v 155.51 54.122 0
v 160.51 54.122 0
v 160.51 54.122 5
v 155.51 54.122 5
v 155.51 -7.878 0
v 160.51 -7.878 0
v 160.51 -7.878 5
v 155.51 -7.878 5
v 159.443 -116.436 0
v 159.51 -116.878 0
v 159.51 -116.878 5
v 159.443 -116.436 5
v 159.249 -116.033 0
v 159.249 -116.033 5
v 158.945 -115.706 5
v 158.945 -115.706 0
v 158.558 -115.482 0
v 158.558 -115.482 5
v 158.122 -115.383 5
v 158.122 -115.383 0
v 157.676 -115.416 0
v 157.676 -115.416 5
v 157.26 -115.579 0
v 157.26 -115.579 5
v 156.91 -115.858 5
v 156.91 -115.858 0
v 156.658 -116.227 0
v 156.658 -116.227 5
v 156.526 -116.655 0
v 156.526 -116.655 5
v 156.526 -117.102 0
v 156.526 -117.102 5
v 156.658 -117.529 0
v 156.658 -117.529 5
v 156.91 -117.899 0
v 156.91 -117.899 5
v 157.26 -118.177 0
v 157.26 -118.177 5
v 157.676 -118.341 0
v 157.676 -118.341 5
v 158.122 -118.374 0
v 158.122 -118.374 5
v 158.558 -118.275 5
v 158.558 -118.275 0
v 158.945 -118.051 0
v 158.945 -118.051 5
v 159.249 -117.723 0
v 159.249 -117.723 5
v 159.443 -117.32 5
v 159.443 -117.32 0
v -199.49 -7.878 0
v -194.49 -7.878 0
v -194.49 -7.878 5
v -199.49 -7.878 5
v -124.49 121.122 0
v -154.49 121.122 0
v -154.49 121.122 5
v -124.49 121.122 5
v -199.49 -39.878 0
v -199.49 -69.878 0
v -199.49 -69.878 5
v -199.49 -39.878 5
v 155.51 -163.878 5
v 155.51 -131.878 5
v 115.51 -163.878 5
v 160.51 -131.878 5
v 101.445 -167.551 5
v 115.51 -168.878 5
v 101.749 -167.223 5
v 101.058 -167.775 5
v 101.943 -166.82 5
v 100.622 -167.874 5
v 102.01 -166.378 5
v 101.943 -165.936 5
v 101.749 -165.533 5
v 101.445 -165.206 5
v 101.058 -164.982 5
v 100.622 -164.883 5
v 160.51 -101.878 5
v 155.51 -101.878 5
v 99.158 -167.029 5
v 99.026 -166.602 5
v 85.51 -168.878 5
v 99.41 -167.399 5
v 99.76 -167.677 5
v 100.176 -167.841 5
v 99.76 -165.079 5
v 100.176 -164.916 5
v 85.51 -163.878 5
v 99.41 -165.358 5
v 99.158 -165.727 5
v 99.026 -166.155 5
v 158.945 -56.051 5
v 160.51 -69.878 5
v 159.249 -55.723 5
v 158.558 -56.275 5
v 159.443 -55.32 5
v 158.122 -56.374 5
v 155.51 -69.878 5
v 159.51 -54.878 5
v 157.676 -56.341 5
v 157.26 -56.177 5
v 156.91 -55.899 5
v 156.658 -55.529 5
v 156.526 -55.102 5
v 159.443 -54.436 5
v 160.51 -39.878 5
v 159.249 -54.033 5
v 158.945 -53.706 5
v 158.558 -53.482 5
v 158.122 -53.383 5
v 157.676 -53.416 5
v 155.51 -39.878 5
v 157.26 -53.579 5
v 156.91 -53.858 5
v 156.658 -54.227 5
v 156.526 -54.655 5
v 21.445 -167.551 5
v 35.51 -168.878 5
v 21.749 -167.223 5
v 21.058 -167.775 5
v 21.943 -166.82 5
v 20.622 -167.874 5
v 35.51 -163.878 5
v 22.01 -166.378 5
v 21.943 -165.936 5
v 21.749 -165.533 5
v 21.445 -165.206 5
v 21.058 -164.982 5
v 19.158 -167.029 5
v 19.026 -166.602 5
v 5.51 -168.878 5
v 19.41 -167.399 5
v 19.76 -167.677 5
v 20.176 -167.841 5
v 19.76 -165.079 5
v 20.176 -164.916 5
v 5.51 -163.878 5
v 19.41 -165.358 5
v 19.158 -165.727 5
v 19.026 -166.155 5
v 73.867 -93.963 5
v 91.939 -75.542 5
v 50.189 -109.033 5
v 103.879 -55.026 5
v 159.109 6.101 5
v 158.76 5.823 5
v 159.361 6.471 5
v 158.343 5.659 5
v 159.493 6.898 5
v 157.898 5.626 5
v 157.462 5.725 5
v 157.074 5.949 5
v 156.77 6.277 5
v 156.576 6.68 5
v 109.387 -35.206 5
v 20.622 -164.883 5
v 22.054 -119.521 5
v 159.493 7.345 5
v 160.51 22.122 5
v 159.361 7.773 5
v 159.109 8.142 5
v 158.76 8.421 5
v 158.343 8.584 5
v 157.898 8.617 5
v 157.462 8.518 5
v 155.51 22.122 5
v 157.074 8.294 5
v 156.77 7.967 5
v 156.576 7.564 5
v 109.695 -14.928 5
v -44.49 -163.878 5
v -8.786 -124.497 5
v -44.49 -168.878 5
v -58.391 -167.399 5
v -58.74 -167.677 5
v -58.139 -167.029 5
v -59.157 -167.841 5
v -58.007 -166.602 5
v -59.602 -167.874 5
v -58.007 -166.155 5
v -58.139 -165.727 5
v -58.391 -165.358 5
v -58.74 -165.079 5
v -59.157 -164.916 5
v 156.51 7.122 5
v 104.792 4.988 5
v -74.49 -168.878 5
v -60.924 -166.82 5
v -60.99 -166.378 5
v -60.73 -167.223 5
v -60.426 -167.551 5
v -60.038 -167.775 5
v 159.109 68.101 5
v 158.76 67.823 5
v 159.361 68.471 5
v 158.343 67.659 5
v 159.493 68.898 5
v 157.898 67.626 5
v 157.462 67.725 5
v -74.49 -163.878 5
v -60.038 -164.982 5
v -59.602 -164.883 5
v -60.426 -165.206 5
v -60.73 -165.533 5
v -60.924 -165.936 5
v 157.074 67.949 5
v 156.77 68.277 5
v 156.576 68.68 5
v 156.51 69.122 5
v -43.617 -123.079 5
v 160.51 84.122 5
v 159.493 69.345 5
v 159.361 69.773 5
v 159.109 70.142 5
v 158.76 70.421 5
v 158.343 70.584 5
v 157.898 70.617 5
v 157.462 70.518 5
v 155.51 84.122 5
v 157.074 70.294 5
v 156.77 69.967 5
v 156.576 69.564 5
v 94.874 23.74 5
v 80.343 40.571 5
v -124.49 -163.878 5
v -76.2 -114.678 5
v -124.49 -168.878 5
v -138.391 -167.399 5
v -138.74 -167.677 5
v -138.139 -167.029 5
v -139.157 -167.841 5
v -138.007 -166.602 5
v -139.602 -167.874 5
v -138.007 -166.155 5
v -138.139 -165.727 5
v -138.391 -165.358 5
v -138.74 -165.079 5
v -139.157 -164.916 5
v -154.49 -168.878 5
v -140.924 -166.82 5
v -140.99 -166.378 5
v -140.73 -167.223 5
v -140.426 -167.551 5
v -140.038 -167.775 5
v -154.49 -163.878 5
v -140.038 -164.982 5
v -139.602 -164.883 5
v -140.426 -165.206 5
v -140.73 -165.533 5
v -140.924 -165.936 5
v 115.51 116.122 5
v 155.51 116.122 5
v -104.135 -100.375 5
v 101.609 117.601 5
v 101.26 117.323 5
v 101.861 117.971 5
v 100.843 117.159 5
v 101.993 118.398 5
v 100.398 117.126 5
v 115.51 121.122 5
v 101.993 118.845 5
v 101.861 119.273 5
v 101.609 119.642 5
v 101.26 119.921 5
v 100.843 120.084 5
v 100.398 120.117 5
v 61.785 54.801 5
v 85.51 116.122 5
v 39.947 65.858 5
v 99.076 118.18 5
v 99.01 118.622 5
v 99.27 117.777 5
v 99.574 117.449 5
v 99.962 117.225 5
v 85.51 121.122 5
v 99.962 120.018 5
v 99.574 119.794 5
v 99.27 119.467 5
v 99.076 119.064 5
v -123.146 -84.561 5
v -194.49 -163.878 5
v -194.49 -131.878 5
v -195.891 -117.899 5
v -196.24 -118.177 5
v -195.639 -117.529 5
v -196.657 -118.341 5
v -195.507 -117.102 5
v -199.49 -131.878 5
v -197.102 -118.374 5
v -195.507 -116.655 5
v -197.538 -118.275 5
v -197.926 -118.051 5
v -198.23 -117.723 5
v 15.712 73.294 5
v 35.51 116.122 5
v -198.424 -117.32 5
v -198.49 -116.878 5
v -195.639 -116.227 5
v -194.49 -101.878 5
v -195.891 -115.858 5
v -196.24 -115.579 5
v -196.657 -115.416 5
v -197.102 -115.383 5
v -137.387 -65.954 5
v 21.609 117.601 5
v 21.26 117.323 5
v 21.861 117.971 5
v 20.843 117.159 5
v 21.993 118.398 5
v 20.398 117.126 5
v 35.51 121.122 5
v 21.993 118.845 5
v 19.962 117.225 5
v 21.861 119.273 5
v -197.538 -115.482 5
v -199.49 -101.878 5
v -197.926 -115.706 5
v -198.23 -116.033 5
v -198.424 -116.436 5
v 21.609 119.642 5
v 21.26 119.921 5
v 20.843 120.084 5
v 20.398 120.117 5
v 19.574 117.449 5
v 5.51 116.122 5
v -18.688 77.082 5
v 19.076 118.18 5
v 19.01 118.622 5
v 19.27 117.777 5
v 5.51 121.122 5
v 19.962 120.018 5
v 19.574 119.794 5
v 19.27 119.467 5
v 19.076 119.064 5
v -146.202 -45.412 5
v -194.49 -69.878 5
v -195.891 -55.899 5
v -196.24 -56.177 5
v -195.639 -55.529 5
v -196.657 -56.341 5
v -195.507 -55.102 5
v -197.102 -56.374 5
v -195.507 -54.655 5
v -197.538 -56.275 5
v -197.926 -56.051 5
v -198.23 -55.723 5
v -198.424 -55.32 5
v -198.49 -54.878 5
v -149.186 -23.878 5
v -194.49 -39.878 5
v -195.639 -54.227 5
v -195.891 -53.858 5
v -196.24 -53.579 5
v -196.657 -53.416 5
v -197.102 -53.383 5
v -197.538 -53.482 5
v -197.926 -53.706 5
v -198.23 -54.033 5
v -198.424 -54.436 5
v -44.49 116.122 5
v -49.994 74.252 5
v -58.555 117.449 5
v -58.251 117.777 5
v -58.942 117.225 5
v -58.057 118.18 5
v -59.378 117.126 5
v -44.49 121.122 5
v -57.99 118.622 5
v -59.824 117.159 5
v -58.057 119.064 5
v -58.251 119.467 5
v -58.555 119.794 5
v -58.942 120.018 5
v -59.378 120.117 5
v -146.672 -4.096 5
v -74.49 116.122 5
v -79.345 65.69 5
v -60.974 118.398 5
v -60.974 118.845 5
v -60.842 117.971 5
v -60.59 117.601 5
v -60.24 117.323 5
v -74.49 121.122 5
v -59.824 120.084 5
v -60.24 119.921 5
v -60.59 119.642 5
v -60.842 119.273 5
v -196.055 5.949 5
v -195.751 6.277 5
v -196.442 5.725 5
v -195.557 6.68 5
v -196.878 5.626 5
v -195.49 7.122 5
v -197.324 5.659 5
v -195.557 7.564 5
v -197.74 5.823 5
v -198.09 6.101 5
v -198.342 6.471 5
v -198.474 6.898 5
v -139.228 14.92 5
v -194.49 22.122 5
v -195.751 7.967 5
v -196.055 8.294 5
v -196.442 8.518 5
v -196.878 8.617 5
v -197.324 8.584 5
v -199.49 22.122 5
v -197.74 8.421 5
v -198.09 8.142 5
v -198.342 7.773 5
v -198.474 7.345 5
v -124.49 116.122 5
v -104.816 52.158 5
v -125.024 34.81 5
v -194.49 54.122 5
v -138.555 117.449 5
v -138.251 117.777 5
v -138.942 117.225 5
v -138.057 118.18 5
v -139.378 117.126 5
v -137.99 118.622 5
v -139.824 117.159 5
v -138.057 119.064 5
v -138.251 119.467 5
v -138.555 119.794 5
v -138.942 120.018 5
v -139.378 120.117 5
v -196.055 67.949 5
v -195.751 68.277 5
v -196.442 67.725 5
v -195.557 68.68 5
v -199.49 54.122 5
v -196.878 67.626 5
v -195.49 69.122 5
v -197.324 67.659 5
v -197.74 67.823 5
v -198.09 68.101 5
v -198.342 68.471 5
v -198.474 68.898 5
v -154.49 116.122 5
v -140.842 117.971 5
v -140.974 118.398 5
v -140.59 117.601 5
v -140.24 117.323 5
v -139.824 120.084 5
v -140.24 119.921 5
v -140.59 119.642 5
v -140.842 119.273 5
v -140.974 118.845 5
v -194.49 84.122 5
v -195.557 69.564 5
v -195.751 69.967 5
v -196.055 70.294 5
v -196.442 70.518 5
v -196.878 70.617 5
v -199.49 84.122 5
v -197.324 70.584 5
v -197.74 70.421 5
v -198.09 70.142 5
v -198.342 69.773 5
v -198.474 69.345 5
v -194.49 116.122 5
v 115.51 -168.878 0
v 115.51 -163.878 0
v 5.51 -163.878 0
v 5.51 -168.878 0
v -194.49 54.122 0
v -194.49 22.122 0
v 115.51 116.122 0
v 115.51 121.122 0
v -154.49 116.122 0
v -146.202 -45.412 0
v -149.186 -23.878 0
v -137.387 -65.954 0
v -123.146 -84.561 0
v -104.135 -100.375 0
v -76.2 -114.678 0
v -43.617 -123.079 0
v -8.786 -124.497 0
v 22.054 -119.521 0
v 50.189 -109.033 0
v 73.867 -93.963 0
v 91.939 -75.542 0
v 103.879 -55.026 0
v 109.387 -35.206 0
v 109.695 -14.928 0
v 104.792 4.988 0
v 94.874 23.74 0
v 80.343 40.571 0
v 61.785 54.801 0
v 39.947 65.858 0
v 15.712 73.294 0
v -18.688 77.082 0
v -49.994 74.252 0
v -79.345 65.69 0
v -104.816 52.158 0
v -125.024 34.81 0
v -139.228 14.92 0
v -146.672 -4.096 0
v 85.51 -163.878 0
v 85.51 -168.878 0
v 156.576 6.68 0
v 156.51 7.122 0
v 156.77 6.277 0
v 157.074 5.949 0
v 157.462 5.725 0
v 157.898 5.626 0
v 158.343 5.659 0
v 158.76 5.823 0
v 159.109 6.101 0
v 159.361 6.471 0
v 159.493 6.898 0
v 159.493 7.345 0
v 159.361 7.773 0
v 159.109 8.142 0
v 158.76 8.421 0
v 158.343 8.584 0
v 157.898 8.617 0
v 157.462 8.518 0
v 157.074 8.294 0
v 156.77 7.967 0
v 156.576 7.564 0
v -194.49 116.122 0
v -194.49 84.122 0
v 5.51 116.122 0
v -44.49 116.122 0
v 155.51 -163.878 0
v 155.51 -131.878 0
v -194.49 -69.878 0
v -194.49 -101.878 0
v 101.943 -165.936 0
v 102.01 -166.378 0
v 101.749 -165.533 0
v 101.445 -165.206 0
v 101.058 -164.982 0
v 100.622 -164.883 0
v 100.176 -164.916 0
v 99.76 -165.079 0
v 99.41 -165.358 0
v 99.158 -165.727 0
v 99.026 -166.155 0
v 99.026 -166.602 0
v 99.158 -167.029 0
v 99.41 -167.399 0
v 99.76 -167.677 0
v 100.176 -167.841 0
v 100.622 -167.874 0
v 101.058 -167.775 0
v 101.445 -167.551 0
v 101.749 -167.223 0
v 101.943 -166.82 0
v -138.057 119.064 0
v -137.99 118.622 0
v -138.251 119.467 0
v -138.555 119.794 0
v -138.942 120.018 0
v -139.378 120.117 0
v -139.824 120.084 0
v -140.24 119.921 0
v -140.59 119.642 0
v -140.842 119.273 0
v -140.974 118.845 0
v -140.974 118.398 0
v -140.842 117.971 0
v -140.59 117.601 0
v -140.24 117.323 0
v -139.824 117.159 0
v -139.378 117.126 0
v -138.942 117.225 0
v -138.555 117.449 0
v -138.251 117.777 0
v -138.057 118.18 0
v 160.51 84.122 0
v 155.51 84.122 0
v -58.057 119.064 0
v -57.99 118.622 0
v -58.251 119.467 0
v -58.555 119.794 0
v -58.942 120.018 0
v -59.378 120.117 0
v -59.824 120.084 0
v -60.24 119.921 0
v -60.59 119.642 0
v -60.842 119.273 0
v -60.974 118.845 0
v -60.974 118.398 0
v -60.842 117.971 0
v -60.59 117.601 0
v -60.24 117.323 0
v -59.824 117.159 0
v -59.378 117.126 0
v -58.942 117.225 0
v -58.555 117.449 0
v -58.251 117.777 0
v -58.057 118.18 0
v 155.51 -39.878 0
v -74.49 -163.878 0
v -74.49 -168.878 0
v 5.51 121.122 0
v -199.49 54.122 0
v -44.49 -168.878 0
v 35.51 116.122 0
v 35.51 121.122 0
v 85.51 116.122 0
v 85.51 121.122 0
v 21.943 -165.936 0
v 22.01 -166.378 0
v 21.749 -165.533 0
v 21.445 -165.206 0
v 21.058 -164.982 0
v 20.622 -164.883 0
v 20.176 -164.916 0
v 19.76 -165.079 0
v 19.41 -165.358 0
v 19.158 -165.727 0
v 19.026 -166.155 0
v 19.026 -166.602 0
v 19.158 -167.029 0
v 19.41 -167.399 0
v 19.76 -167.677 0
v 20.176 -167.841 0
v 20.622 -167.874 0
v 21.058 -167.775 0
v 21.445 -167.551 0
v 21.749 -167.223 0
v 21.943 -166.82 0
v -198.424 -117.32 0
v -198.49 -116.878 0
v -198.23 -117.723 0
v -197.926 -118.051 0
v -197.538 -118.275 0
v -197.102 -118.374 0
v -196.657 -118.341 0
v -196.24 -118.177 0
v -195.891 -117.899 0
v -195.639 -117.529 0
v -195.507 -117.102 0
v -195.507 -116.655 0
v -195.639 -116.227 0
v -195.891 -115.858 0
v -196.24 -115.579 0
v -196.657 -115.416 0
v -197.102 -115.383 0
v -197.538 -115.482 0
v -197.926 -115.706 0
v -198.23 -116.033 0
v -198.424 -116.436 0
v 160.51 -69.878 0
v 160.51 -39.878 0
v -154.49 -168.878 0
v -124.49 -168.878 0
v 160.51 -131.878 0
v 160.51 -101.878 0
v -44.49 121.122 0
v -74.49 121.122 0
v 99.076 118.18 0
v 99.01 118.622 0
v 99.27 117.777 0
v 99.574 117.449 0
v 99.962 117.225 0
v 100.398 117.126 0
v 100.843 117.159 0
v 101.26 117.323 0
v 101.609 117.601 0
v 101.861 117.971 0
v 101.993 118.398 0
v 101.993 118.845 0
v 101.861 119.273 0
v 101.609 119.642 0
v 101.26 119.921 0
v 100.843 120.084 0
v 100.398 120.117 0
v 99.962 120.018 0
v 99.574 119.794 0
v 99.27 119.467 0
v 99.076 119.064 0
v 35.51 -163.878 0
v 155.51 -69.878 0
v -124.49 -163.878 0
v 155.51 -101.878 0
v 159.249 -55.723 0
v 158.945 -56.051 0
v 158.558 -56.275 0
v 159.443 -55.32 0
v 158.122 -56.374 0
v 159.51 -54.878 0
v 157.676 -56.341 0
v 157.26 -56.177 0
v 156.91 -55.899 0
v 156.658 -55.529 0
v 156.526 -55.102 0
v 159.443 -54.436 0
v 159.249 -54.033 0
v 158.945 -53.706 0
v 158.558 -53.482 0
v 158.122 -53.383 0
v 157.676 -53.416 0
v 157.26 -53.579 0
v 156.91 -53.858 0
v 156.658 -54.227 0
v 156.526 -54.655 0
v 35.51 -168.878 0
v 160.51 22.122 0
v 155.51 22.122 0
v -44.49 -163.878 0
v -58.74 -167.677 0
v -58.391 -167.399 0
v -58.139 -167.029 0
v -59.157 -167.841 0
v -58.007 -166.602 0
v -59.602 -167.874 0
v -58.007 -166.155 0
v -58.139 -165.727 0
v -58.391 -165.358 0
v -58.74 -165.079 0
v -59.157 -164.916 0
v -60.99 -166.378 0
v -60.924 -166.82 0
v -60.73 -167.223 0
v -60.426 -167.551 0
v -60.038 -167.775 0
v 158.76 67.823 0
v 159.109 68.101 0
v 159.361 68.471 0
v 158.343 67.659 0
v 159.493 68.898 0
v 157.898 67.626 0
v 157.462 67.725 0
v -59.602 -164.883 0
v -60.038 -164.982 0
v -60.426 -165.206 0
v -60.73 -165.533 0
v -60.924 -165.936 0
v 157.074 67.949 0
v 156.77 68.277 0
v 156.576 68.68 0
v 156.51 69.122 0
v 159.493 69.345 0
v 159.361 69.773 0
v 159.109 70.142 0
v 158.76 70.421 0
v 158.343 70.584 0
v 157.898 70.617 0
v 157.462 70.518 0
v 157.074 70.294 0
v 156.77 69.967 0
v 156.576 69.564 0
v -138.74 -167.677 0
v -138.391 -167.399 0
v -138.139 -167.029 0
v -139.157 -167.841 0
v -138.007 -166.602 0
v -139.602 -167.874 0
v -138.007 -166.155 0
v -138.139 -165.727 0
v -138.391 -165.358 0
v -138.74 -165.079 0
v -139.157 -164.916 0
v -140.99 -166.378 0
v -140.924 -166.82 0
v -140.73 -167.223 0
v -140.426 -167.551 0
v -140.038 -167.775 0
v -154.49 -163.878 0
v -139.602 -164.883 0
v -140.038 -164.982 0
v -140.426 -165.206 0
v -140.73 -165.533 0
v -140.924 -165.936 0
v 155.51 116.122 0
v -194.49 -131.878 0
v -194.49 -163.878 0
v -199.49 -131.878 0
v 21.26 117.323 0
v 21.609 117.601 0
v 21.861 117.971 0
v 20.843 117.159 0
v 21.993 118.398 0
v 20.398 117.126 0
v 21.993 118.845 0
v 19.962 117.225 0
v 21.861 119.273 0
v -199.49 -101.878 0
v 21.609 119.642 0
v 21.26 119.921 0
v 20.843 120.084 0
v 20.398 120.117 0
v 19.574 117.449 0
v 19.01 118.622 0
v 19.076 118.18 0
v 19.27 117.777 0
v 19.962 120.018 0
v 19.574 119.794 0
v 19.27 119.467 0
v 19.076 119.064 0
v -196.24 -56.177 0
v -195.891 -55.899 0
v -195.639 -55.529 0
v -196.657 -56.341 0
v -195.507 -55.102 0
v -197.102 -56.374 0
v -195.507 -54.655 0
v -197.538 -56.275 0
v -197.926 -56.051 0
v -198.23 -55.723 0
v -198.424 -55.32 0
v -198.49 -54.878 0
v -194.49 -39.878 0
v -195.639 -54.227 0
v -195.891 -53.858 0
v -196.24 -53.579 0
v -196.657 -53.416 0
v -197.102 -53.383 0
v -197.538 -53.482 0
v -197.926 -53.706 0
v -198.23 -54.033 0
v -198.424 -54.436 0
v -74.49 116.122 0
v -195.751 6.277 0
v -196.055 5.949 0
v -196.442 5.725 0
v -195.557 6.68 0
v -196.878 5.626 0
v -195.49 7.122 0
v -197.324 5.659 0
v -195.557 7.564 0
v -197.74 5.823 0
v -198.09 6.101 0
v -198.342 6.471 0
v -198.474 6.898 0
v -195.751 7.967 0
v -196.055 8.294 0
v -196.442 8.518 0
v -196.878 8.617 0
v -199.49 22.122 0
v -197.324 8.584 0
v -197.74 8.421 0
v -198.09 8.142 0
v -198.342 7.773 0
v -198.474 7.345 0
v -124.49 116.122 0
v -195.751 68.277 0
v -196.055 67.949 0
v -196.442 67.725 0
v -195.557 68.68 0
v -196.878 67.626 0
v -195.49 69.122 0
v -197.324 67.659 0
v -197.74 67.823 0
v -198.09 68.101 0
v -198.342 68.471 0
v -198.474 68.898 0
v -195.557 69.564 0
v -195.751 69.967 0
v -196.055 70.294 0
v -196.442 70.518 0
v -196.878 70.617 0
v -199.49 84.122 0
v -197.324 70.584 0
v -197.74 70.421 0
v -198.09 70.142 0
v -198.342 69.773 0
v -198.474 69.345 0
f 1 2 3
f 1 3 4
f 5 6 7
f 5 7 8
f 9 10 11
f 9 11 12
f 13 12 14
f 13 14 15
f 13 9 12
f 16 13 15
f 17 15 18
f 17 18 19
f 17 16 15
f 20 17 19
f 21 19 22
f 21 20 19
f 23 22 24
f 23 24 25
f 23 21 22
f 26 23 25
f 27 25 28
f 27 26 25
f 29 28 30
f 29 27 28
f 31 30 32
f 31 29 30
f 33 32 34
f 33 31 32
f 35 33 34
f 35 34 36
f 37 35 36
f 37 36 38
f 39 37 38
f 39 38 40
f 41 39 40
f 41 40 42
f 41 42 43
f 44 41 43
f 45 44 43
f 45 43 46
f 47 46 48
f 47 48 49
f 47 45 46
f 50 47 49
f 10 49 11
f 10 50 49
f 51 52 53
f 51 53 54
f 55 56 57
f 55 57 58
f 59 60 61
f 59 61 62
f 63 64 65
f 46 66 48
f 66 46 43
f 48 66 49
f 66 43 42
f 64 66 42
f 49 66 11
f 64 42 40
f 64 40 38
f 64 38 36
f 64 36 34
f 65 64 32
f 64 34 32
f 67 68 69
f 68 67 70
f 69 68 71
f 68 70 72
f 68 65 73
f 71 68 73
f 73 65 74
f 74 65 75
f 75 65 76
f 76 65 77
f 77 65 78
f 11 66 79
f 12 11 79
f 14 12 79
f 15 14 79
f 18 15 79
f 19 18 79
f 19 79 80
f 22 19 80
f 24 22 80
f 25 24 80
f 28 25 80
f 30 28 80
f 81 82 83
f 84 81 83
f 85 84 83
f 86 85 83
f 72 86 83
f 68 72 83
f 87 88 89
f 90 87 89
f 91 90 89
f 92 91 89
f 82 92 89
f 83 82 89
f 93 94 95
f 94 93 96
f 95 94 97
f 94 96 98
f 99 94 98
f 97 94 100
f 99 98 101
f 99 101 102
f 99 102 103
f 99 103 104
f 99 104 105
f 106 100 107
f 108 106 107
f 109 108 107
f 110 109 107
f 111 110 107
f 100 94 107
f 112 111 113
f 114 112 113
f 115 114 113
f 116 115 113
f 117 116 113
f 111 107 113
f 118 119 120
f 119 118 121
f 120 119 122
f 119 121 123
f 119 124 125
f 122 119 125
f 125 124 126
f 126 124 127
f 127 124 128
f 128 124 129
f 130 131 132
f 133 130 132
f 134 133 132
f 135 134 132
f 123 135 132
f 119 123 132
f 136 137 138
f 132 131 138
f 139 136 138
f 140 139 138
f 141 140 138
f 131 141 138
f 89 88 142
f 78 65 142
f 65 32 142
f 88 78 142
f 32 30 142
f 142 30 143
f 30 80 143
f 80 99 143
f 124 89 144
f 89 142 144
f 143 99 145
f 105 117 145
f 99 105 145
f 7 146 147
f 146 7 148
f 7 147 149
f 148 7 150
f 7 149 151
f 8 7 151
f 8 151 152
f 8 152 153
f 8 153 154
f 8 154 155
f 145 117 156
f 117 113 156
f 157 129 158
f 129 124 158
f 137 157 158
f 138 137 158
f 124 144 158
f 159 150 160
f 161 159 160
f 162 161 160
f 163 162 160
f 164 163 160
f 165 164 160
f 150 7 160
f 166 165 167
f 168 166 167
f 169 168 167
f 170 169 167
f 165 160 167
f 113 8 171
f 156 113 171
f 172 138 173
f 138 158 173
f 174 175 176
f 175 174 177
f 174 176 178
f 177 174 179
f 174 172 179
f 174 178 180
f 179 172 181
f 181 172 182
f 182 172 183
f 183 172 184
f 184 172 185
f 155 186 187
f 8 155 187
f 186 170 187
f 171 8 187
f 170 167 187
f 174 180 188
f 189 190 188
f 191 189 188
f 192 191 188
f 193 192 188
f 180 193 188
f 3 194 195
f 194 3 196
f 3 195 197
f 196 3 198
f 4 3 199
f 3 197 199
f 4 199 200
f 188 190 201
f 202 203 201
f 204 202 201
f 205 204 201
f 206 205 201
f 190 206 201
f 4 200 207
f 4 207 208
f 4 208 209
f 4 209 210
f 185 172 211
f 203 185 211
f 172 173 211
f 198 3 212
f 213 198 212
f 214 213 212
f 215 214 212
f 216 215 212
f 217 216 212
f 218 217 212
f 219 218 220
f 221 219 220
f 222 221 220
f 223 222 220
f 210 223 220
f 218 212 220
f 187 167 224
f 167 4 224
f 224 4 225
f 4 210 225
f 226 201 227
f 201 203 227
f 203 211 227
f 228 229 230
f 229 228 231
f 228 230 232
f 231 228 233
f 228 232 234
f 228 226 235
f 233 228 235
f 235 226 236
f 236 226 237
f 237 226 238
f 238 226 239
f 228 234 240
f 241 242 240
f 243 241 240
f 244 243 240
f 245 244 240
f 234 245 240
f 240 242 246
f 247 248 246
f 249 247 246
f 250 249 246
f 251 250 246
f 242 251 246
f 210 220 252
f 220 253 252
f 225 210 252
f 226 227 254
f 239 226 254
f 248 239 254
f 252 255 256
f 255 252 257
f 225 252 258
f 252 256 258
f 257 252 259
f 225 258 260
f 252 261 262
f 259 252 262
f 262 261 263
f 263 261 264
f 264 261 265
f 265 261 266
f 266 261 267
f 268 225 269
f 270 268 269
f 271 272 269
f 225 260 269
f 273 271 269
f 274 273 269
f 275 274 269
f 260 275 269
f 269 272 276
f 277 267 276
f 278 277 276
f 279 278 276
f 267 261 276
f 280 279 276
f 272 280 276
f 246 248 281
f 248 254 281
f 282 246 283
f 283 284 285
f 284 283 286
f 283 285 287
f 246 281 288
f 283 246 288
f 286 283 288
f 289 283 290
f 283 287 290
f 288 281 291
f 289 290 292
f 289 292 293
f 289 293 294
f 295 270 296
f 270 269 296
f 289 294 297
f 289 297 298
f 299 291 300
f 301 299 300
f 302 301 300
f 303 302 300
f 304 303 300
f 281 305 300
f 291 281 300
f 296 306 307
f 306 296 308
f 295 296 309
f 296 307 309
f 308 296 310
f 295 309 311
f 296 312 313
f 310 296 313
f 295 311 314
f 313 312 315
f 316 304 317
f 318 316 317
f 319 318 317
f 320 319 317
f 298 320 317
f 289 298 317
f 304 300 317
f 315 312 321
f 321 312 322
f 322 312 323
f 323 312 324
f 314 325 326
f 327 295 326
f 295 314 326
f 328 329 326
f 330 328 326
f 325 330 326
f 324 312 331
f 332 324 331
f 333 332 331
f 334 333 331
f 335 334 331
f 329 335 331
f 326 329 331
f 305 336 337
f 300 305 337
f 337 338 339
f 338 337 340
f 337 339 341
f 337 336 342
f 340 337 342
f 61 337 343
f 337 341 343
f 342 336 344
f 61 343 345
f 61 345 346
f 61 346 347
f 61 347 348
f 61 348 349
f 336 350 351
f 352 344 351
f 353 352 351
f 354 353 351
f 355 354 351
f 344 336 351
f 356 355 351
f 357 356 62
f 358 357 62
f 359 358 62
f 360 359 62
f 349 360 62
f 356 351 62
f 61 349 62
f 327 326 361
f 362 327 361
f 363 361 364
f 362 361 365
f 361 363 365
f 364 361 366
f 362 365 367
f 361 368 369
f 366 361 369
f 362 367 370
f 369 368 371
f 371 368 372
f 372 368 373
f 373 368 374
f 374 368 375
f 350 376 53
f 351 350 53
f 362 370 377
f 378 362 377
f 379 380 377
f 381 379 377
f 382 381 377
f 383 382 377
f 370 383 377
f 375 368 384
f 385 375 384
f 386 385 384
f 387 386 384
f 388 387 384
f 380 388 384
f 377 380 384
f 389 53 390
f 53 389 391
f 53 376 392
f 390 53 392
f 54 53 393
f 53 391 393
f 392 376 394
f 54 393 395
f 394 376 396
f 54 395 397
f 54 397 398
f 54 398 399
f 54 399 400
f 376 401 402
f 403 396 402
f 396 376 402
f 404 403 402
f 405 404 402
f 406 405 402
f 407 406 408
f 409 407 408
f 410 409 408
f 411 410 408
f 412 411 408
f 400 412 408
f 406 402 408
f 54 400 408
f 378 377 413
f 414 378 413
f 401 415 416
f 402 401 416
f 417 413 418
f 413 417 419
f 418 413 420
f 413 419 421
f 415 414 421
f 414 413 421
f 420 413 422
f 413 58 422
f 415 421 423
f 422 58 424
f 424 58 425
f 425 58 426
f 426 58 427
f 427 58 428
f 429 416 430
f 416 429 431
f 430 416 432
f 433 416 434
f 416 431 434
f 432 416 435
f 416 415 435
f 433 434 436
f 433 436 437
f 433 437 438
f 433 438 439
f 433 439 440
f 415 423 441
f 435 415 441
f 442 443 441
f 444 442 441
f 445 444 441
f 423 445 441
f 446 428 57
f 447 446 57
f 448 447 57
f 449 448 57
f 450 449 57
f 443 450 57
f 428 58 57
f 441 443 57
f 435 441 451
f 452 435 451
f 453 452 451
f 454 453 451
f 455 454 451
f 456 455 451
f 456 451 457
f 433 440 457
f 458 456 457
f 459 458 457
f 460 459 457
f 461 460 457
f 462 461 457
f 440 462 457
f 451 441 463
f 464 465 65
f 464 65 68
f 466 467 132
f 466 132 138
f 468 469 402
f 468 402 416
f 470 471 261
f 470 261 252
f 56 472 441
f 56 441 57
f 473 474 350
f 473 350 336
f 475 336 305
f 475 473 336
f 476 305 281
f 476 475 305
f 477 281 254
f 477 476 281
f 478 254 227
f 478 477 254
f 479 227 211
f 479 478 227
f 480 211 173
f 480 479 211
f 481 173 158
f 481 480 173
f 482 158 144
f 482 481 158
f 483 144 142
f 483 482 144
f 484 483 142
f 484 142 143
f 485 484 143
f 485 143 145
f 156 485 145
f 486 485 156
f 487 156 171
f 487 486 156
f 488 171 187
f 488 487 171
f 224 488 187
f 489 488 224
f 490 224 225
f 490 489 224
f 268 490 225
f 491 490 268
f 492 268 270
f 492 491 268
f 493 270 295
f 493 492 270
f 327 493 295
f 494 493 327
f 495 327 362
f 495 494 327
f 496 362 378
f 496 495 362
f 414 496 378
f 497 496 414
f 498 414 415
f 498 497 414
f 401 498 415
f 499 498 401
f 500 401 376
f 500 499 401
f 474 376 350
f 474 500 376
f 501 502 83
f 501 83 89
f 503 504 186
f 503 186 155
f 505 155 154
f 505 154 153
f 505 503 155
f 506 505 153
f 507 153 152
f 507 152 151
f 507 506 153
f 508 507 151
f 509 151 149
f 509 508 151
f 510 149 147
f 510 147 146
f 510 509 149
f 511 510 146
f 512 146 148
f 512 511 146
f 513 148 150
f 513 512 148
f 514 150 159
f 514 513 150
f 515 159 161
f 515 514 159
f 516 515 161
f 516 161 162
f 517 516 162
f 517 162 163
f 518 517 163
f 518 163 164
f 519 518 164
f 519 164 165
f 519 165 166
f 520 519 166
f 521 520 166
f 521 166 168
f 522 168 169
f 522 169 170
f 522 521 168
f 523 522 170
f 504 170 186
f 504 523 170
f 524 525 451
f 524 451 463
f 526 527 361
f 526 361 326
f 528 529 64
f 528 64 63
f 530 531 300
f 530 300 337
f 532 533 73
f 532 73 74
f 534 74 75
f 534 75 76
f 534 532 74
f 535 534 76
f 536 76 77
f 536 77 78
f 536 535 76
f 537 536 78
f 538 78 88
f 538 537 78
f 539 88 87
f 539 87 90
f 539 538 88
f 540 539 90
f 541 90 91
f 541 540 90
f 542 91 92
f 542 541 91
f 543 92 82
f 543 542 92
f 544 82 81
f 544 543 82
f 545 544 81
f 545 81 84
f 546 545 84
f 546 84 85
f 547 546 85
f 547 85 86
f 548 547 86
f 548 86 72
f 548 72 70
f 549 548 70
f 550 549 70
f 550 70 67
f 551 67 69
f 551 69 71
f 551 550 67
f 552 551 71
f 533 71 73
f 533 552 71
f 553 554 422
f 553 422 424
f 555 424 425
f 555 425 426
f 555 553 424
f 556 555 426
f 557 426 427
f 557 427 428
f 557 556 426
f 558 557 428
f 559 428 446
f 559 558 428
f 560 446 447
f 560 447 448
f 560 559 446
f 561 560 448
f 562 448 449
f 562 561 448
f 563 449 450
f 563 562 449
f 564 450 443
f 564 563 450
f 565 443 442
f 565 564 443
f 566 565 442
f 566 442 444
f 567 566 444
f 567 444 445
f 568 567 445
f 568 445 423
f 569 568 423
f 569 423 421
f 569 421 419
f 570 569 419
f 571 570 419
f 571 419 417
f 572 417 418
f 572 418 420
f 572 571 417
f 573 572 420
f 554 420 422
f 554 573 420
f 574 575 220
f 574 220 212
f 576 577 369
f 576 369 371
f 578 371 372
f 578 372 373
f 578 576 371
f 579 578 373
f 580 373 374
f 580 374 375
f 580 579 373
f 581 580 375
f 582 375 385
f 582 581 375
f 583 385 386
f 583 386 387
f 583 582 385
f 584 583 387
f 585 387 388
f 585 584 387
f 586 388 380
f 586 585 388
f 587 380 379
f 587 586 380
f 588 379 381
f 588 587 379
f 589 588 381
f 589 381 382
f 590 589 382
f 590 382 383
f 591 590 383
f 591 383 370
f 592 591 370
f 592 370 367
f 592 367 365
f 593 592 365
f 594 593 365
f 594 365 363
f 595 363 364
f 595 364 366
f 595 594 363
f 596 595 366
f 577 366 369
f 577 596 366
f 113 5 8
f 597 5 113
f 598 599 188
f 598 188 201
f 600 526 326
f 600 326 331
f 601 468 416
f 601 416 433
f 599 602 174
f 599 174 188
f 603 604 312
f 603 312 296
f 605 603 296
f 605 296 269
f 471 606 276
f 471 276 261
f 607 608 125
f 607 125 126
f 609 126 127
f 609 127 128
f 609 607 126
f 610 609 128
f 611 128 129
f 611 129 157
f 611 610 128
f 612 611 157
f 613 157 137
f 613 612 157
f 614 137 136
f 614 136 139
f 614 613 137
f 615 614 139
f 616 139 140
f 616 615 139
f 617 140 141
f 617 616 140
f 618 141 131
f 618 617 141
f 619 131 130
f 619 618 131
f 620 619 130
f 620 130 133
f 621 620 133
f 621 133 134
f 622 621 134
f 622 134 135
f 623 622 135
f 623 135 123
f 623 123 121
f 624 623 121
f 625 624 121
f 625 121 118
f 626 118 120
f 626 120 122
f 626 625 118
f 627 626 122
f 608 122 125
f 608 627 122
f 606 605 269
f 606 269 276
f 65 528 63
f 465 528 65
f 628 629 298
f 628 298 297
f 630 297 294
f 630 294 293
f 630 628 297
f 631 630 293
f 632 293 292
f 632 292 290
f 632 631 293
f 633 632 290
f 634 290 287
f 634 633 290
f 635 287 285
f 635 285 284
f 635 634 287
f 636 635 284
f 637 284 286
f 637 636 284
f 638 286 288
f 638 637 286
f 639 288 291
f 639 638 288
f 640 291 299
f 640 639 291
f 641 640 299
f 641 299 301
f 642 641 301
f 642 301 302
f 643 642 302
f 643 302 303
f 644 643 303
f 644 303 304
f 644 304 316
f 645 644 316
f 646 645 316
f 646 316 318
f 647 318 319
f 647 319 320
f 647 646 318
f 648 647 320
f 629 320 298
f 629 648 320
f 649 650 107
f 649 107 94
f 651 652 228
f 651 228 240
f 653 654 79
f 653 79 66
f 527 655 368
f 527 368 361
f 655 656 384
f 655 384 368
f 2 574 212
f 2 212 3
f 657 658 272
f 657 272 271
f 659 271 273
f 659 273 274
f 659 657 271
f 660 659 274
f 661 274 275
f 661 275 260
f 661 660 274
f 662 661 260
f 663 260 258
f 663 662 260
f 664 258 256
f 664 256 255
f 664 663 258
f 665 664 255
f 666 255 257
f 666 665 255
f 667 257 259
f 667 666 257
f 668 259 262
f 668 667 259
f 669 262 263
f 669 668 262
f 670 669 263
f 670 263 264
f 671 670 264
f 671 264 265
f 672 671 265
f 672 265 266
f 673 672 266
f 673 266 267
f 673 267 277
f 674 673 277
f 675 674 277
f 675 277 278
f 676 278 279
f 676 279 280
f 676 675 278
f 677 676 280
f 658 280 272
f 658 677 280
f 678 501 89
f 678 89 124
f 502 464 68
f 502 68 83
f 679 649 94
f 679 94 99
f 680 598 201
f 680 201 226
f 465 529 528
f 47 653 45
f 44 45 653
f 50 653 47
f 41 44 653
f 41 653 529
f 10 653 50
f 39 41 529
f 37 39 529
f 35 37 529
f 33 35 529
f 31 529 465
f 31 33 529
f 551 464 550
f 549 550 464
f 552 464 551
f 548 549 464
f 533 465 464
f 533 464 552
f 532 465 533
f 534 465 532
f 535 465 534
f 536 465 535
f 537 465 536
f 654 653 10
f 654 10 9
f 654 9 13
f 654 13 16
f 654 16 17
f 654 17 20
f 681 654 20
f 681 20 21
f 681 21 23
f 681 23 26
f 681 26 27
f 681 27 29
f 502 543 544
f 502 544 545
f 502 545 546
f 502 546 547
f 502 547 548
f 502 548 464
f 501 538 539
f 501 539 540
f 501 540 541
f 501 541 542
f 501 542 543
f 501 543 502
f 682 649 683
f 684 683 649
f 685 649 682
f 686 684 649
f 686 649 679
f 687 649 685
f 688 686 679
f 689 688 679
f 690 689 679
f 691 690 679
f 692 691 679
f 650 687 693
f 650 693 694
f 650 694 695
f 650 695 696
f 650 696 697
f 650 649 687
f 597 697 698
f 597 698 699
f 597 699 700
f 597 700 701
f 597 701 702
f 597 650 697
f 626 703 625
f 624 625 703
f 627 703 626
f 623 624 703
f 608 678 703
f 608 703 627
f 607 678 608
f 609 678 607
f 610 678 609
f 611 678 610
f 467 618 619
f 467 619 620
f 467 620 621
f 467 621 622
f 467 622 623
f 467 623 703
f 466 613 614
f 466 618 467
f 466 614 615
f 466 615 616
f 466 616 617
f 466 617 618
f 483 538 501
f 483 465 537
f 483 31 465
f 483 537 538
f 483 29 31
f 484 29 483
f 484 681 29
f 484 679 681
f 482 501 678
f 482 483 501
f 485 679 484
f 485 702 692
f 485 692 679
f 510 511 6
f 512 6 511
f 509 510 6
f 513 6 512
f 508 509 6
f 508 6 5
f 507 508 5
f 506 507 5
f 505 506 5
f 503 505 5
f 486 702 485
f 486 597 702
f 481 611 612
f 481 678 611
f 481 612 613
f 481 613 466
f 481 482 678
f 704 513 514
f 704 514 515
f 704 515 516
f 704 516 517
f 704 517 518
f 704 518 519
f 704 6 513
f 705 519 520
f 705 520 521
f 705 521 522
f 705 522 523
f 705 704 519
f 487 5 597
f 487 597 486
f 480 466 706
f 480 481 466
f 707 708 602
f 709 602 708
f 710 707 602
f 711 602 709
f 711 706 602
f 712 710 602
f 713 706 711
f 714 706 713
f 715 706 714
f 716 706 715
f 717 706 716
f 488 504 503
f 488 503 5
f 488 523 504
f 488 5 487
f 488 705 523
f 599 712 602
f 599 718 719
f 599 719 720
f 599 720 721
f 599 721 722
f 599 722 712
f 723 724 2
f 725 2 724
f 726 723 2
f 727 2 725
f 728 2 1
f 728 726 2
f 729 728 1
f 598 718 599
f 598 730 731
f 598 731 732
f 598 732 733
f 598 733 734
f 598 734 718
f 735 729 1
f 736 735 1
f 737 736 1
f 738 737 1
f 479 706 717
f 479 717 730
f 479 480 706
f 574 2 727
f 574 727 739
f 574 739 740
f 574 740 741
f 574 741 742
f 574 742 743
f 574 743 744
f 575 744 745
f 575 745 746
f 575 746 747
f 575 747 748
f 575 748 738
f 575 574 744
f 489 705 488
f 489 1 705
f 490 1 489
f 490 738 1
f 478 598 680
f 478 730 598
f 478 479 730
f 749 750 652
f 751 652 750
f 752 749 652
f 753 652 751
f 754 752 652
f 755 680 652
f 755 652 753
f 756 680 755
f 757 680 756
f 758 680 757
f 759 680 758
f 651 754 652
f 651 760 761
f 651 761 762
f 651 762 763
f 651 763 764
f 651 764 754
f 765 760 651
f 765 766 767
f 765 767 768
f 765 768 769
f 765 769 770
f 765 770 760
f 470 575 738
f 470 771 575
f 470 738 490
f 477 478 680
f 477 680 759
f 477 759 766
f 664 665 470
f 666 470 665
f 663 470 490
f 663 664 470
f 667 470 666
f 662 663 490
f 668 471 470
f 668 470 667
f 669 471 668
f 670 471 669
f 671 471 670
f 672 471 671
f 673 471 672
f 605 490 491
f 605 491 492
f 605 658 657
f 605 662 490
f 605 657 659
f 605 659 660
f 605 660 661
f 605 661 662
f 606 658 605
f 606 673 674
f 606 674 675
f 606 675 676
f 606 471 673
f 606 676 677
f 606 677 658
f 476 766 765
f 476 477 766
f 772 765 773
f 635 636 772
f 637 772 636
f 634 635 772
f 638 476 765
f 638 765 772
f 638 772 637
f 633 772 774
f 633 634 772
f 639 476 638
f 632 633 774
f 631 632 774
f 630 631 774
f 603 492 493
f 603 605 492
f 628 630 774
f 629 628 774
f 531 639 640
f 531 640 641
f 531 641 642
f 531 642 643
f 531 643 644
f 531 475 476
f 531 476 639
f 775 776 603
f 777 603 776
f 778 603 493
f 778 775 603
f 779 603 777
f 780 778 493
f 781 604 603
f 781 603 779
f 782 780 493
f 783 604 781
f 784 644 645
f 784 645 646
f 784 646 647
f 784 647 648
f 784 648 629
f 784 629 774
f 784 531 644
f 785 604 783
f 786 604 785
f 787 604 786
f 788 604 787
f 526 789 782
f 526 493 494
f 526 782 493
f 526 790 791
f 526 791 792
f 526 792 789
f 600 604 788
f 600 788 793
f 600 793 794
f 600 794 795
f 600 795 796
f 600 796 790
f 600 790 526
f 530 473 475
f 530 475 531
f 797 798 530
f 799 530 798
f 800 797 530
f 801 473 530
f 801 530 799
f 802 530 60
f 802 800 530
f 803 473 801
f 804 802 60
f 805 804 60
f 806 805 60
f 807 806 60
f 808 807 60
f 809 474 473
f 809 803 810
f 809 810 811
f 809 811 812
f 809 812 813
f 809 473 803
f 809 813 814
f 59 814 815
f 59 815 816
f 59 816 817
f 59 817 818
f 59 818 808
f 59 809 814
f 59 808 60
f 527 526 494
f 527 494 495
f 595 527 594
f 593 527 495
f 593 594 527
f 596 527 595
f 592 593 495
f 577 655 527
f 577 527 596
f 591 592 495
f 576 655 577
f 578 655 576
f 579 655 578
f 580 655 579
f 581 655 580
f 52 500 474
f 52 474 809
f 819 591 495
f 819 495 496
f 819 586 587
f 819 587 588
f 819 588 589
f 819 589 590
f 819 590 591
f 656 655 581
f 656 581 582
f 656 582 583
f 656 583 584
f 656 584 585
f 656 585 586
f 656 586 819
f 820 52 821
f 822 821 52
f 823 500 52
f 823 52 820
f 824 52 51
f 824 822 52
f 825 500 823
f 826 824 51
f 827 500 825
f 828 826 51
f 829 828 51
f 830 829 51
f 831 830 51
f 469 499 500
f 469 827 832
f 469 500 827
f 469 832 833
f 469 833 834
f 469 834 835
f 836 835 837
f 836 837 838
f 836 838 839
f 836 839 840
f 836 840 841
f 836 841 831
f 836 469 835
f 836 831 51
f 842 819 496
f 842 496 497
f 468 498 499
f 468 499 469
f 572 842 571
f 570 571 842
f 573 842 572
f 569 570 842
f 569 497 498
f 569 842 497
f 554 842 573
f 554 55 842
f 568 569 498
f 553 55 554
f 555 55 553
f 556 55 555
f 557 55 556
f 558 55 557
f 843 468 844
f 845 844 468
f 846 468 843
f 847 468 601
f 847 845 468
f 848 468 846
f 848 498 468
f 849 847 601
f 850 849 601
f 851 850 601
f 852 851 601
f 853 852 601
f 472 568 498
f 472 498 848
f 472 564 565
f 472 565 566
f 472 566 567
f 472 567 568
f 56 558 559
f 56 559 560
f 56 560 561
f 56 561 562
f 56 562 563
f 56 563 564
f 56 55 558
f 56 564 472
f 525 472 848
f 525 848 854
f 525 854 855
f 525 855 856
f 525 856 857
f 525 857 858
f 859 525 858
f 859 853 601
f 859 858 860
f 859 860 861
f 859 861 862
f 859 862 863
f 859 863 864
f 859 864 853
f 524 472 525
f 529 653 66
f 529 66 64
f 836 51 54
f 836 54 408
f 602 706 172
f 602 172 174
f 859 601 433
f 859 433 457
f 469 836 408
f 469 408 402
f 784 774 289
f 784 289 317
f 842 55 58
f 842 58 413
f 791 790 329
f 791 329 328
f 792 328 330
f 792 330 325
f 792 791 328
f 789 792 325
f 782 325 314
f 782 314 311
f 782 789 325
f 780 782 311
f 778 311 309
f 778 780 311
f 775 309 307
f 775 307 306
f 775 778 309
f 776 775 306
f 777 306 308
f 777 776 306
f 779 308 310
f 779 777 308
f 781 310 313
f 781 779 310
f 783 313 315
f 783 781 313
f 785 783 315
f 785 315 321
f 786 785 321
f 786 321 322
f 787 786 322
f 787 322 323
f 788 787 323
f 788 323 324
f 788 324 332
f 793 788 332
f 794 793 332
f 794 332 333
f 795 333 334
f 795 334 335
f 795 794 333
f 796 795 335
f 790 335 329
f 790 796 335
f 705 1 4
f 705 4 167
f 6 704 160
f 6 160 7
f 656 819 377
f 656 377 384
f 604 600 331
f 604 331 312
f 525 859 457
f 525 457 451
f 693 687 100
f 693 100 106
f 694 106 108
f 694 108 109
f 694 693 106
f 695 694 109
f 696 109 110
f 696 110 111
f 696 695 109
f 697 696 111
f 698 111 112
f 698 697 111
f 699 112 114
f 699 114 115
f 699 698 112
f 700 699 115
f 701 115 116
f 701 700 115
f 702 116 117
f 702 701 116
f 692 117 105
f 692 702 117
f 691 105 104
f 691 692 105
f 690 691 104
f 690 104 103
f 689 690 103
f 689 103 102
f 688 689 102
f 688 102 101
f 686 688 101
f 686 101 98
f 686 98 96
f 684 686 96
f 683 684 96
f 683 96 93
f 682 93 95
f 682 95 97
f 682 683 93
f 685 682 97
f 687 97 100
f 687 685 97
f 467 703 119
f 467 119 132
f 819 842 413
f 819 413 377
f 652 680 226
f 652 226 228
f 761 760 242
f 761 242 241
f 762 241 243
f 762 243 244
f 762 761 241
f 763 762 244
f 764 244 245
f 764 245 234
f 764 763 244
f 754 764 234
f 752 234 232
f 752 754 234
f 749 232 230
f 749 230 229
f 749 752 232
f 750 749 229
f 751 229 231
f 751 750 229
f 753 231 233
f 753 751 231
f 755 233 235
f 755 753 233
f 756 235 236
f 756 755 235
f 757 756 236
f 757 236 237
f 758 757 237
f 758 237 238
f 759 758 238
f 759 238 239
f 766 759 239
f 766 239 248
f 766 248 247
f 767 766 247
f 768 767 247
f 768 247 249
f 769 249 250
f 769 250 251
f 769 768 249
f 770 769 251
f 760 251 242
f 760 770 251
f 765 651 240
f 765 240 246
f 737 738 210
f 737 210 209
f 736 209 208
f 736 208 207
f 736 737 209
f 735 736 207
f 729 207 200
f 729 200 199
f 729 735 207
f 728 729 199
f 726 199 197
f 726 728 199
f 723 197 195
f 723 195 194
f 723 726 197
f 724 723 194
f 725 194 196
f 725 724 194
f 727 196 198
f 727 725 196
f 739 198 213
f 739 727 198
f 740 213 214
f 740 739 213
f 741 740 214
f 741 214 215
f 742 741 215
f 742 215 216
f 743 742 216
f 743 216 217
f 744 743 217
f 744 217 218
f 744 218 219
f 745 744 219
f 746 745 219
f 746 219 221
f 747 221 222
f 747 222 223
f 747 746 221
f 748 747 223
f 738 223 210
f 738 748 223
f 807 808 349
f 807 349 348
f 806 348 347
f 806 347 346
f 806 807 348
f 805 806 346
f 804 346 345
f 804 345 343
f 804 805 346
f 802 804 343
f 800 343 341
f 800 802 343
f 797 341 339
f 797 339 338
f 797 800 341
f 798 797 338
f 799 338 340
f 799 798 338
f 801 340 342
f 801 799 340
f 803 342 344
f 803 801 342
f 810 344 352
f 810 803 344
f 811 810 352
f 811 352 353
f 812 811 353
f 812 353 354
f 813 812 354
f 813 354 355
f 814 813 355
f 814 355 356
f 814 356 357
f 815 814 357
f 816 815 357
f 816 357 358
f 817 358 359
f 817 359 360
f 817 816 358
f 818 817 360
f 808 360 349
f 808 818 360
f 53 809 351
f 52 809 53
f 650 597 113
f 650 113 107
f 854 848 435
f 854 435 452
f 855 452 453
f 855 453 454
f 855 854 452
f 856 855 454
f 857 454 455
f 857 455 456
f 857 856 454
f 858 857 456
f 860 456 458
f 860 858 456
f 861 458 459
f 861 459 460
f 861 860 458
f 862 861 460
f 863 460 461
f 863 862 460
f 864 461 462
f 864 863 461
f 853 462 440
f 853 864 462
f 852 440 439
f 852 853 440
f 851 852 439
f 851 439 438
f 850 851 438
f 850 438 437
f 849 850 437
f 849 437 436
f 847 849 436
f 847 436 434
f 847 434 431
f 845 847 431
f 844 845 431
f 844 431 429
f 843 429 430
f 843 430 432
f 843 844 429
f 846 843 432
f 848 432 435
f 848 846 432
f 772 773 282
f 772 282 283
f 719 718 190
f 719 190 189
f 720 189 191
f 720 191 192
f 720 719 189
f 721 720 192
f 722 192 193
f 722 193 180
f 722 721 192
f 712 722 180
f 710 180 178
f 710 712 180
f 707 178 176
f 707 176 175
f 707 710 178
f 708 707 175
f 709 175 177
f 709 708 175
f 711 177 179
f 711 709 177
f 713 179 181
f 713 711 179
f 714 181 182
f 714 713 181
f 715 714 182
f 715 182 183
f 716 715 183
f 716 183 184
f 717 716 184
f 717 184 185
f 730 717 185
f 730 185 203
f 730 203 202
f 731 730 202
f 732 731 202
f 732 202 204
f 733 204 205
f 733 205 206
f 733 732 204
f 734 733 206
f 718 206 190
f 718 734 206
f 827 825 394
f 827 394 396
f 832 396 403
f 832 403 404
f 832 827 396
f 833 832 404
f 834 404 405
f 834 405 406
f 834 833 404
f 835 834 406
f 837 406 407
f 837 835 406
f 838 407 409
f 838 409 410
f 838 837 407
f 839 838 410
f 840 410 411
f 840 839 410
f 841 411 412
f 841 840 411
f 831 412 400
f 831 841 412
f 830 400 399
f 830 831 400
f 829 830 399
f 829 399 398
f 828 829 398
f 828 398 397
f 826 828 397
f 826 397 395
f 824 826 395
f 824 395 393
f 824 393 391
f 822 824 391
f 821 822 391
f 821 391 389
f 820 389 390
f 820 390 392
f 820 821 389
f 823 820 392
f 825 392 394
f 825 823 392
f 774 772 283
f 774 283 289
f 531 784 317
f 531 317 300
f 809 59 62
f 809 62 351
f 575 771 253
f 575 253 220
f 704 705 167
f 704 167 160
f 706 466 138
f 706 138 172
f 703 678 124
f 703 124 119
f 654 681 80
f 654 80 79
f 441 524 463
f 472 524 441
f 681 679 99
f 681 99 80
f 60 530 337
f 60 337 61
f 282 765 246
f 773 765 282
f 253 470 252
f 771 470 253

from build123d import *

# Parameters (mm, degrees)
SKETCH1_R           = 1.5
SKETCH1_RX          = 129.696010234
SKETCH1_RY          = 100.962749524
BOSS_EXTRUDE1_DEPTH = 5


with BuildPart() as part:
    # Sketch1 → Boss-Extrude1 (new body)
    with BuildSketch(Plane.XY):
        Polygon((155.509699879, -163.878323363), (115.509699879, -163.878323363), (115.509699879, -168.878323363), (85.509699879, -168.878323363), (85.509699879, -163.878323363), (35.509699879, -163.878323363), (35.509699879, -168.878323363), (5.509699879, -168.878323363), (5.509699879, -163.878323363), (-44.490300121, -163.878323363), (-44.490300121, -168.878323363), (-74.490300121, -168.878323363), (-74.490300121, -163.878323363), (-124.490300121, -163.878323363), (-124.490300121, -168.878323363), (-154.490300121, -168.878323363), (-154.490300121, -163.878323363), (-194.490300121, -163.878323363), (-194.490300121, -131.87832215), (-199.490300121, -131.87832215), (-199.490300121, -101.87832215), (-194.490300121, -101.87832215), (-194.490300121, -69.878320937), (-199.490300121, -69.878320937), (-199.490300121, -39.878320937), (-194.490300121, -39.878320937), (-194.490300121, -7.878319723), (-199.490300121, -7.878319723), (-199.490300121, 22.121680277), (-194.490300121, 22.121680277), (-194.490300121, 54.12168149), (-199.490300121, 54.12168149), (-199.490300121, 84.12168149), (-194.490300121, 84.12168149), (-194.490300121, 116.121682703), (-154.490300121, 116.121682703), (-154.490300121, 121.121682703), (-124.490300121, 121.121682703), (-124.490300121, 116.121682703), (-74.490300121, 116.121682703), (-74.490300121, 121.121682703), (-44.490300121, 121.121682703), (-44.490300121, 116.121682703), (5.509699879, 116.121682703), (5.509699879, 121.121682703), (35.509699879, 121.121682703), (35.509699879, 116.121682703), (85.509699879, 116.121682703), (85.509699879, 121.121682703), (115.509699879, 121.121682703), (115.509699879, 116.121682703), (155.509699879, 116.121682703), (155.509699879, 84.12168149), (160.509699879, 84.12168149), (160.509699879, 54.12168149), (155.509699879, 54.12168149), (155.509699879, 22.121680277), (160.509699879, 22.121680277), (160.509699879, -7.878319723), (155.509699879, -7.878319723), (155.509699879, -39.878320937), (160.509699879, -39.878320937), (160.509699879, -69.878320937), (155.509699879, -69.878320937), (155.509699879, -101.87832215), (160.509699879, -101.87832215), (160.509699879, -131.87832215), (155.509699879, -131.87832215), align=None)
        with Locations((-139.490300121, 118.621682703)):
            Circle(SKETCH1_R, mode=Mode.SUBTRACT)
        with Locations((-59.490300121, 118.621682703)):
            Circle(SKETCH1_R, mode=Mode.SUBTRACT)
        with Locations((-196.990300121, 69.12168149)):
            Circle(SKETCH1_R, mode=Mode.SUBTRACT)
        with Locations((-196.990300121, 7.121680277)):
            Circle(SKETCH1_R, mode=Mode.SUBTRACT)
        with Locations(Location((158.009699879, 7.121680277, 0), (0, 0, 180))):
            Circle(SKETCH1_R, mode=Mode.SUBTRACT)
        with Locations(Location((158.009699879, 69.12168149, 0), (0, 0, 180))):
            Circle(SKETCH1_R, mode=Mode.SUBTRACT)
        with Locations(Location((100.509699879, 118.621682703, 0), (0, 0, 180))):
            Circle(SKETCH1_R, mode=Mode.SUBTRACT)
        with Locations(Location((20.509699879, 118.621682703, 0), (0, 0, 180))):
            Circle(SKETCH1_R, mode=Mode.SUBTRACT)
        with Locations((158.009699879, -54.878320937)):
            Circle(SKETCH1_R, mode=Mode.SUBTRACT)
        with Locations((158.009699879, -116.87832215)):
            Circle(SKETCH1_R, mode=Mode.SUBTRACT)
        with Locations((100.509699879, -166.378323363)):
            Circle(SKETCH1_R, mode=Mode.SUBTRACT)
        with Locations((20.509699879, -166.378323363)):
            Circle(SKETCH1_R, mode=Mode.SUBTRACT)
        with Locations(Location((-59.490300121, -166.378323363, 0), (0, 0, 180))):
            Circle(SKETCH1_R, mode=Mode.SUBTRACT)
        with Locations(Location((-139.490300121, -166.378323363, 0), (0, 0, 180))):
            Circle(SKETCH1_R, mode=Mode.SUBTRACT)
        with Locations(Location((-196.990300121, -54.878320937, 0), (0, 0, 180))):
            Circle(SKETCH1_R, mode=Mode.SUBTRACT)
        with Locations(Location((-196.990300121, -116.87832215, 0), (0, 0, 180))):
            Circle(SKETCH1_R, mode=Mode.SUBTRACT)
        with Locations(Location((-19.490300121, -23.87832033), (0, 0, -180))):
            Ellipse(SKETCH1_RX, SKETCH1_RY, mode=Mode.SUBTRACT)
    extrude(amount=BOSS_EXTRUDE1_DEPTH)


solid = part.part
